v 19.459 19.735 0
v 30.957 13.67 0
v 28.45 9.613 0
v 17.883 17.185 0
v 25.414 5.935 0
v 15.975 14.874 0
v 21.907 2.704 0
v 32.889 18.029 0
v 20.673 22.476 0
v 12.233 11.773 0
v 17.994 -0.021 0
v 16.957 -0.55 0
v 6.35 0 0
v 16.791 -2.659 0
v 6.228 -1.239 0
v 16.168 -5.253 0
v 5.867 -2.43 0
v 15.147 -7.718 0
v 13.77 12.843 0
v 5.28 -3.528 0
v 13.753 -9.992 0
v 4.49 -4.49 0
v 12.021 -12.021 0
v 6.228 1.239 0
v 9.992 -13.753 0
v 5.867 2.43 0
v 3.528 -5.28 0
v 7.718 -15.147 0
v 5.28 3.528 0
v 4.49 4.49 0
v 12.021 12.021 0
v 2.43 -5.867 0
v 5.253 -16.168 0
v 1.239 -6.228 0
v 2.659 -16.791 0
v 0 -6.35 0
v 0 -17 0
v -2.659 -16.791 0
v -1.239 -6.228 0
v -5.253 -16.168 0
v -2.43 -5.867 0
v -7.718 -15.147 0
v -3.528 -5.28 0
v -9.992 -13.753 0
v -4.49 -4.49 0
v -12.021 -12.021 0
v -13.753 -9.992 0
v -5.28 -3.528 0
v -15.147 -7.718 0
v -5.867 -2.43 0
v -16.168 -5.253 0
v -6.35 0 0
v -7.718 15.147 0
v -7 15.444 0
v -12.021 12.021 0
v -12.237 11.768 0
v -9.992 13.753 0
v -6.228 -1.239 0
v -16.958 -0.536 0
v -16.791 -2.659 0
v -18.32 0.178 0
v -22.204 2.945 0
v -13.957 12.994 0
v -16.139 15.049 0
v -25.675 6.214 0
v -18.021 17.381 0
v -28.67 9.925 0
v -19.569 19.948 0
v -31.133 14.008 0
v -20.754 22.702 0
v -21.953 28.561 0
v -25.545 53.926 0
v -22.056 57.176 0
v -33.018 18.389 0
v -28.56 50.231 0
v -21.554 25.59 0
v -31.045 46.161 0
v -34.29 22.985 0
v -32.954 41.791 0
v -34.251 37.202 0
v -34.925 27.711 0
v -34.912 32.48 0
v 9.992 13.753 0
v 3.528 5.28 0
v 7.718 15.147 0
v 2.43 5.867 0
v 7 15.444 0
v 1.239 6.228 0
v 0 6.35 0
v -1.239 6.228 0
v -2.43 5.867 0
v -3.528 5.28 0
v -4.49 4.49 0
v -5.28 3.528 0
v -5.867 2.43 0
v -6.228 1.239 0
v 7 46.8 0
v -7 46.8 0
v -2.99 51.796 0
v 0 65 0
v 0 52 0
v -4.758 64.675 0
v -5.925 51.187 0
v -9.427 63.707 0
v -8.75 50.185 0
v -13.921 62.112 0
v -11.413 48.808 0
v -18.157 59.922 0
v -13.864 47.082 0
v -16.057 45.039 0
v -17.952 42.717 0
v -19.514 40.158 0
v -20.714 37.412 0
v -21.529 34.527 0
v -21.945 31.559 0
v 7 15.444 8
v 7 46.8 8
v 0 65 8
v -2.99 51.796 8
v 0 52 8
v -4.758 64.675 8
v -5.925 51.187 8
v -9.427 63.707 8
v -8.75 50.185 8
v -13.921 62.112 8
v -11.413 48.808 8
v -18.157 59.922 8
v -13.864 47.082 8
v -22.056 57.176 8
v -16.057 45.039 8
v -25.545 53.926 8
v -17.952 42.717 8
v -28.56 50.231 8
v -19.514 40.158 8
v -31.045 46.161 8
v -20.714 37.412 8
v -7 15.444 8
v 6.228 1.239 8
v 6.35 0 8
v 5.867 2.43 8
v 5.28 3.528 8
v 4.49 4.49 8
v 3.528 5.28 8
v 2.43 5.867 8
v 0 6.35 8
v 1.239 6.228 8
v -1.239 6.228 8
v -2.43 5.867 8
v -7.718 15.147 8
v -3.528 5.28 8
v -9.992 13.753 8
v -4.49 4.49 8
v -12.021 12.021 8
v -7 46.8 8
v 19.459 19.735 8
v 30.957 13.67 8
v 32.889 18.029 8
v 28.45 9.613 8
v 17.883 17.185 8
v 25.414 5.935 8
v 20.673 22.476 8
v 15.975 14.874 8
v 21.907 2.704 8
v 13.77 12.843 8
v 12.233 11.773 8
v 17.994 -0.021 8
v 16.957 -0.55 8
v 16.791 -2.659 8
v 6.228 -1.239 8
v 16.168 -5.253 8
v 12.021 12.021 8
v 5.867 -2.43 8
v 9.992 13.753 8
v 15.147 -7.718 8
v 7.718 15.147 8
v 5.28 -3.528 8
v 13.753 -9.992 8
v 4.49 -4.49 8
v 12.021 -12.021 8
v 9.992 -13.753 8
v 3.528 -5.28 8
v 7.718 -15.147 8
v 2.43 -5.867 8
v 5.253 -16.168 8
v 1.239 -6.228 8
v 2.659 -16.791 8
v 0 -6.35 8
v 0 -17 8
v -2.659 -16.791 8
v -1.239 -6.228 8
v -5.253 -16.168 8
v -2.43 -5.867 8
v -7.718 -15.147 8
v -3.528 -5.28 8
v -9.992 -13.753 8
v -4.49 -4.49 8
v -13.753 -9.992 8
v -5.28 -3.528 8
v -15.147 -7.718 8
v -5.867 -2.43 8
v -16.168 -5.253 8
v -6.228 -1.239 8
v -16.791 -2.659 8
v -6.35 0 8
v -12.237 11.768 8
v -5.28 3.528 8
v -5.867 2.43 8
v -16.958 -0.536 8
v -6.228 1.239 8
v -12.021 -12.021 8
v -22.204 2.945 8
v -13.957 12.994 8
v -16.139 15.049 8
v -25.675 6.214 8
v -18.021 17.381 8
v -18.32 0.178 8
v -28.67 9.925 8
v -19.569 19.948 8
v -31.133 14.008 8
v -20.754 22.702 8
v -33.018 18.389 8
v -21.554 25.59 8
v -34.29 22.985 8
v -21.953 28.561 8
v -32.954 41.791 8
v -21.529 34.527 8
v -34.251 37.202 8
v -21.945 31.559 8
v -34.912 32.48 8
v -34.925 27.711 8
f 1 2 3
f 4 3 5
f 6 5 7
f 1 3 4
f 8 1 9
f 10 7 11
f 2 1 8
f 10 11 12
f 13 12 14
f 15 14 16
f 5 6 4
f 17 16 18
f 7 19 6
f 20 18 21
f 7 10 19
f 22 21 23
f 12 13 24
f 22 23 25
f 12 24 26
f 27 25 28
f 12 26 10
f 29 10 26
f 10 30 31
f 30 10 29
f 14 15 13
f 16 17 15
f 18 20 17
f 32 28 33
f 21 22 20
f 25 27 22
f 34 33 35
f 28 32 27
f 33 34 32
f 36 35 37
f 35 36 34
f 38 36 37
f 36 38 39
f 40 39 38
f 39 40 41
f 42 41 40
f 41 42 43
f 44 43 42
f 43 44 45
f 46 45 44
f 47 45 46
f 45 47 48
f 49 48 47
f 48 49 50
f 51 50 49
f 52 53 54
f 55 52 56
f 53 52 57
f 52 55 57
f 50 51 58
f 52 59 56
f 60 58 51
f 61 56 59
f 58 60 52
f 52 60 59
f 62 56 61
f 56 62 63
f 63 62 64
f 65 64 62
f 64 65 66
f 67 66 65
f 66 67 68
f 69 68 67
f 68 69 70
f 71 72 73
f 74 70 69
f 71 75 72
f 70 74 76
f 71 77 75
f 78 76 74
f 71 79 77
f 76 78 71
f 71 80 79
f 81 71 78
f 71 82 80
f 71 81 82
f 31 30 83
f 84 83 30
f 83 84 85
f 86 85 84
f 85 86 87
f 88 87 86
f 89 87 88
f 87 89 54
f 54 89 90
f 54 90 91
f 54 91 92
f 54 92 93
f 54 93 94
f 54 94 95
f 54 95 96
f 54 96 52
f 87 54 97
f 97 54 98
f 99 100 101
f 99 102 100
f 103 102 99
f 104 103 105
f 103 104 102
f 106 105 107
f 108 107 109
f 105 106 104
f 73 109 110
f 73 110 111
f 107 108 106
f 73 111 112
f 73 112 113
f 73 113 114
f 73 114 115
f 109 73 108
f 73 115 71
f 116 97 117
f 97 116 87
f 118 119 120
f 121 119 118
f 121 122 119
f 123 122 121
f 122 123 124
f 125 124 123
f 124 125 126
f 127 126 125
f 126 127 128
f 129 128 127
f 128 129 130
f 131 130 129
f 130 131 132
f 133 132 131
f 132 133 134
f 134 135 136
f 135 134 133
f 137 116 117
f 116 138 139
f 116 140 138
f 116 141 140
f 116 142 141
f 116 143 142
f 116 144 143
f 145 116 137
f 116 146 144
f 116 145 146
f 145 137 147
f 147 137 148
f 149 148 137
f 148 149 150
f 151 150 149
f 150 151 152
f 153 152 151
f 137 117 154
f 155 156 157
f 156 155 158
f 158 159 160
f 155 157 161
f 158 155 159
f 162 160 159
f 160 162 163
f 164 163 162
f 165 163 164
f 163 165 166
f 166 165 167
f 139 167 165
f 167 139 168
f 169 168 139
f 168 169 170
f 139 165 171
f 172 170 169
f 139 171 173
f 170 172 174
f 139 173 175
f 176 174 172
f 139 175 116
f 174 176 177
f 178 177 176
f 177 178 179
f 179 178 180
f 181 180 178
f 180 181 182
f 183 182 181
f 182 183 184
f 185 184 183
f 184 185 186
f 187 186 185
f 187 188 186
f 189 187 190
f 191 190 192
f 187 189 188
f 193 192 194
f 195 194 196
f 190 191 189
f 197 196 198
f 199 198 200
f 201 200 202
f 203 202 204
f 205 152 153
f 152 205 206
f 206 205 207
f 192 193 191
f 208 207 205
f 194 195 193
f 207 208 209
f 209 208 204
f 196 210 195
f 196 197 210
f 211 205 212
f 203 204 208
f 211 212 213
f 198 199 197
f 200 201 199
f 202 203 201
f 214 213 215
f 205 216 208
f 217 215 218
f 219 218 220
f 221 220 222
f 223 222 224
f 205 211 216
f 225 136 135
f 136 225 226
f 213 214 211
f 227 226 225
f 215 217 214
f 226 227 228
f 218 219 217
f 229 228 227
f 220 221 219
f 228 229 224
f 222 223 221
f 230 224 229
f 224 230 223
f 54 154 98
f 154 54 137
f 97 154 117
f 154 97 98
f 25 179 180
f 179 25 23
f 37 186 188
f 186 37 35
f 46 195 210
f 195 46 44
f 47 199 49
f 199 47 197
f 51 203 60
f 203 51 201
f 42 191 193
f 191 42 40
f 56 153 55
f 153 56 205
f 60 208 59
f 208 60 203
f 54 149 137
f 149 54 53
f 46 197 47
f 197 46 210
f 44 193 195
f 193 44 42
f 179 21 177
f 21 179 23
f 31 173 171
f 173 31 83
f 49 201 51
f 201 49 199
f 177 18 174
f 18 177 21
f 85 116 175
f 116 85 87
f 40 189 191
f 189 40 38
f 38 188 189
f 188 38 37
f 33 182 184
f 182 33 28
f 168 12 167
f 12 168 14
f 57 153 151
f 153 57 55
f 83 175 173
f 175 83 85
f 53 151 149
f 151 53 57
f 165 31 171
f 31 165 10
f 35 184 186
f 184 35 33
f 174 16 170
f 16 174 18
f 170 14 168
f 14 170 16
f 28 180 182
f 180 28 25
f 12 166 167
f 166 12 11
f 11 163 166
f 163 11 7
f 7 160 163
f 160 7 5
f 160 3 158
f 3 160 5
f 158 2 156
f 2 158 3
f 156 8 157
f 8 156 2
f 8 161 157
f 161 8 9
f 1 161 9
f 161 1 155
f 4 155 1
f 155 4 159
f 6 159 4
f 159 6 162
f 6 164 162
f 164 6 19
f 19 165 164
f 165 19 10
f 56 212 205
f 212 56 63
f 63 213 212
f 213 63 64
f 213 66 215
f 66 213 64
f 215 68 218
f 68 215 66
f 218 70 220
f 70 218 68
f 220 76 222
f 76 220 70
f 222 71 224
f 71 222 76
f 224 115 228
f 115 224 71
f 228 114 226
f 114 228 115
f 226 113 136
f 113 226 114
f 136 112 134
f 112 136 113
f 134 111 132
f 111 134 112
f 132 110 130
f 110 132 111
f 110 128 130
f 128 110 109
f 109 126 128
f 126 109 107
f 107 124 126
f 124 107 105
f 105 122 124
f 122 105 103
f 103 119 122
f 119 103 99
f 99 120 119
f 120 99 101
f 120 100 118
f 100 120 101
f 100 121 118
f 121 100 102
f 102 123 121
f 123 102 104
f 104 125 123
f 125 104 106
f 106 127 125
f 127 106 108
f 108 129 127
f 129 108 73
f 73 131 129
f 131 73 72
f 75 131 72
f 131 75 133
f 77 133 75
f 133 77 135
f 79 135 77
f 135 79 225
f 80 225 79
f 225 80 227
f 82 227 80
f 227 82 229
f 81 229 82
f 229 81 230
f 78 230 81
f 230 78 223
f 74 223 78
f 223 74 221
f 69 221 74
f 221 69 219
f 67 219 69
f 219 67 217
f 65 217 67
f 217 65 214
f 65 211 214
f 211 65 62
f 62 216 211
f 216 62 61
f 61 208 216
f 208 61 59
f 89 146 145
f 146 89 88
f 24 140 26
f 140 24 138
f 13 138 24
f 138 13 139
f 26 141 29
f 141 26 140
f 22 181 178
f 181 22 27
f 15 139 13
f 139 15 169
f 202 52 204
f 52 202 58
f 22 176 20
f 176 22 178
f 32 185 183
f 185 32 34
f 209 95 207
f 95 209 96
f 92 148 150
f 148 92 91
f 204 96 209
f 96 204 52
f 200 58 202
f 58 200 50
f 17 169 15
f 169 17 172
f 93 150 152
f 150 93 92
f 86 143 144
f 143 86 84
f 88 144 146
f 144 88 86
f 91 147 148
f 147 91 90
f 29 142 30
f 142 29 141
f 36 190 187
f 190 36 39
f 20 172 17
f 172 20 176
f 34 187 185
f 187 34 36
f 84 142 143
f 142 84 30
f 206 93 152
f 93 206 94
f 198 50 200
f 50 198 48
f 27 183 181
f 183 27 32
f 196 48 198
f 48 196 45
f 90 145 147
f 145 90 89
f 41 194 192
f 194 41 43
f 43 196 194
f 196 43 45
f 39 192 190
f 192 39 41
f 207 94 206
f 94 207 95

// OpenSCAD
$fn = 32;

// ----------------------------------------------------------------------
// Hook: 60 mm shank into a 22 mm curl, 8 mm thick
// ----------------------------------------------------------------------

// --- parameters (mm) ---
shank_len = 60;           // shank length from the boss centre
shank_w = 14;             // shank width
boss_d = 34;              // boss diameter
bore_d = 12.7;            // boss bore
curl_in = 22;             // curl inner radius
curl_out = 35;            // curl outer radius
curl_sweep = 250;         // curl sweep angle
hook_t = 8;               // hook thickness

shank_profile = [[-7, 46.8], [7, 46.8], [7, 15], [-7, 15]];
boss_profile = [[17, 0], [16.791, 2.659], [16.168, 5.253], [15.147, 7.718], [13.753, 9.992], [12.021, 12.021], [9.992, 13.753], [7.718, 15.147], [5.253, 16.168], [2.659, 16.791], [0, 17], [-2.659, 16.791], [-5.253, 16.168], [-7.718, 15.147], [-9.992, 13.753], [-12.021, 12.021], [-13.753, 9.992], [-15.147, 7.718], [-16.168, 5.253], [-16.791, 2.659], [-17, 0], [-16.791, -2.659], [-16.168, -5.253], [-15.147, -7.718], [-13.753, -9.992], [-12.021, -12.021], [-9.992, -13.753], [-7.718, -15.147], [-5.253, -16.168], [-2.659, -16.791], [0, -17], [2.659, -16.791], [5.253, -16.168], [7.718, -15.147], [9.992, -13.753], [12.021, -12.021], [13.753, -9.992], [15.147, -7.718], [16.168, -5.253], [16.791, -2.659]];
curl_profile = [[0, 65], [-4.758, 64.675], [-9.427, 63.707], [-13.921, 62.112], [-18.157, 59.922], [-22.056, 57.176], [-25.545, 53.926], [-28.56, 50.231], [-31.045, 46.161], [-32.954, 41.791], [-34.251, 37.202], [-34.912, 32.48], [-34.925, 27.711], [-34.29, 22.985], [-33.018, 18.389], [-31.133, 14.008], [-28.67, 9.925], [-25.675, 6.214], [-22.204, 2.945], [-18.32, 0.178], [-14.096, -2.036], [-9.611, -3.655], [-4.947, -4.649], [-0.191, -4.999], [4.568, -4.701], [9.243, -3.757], [13.746, -2.188], [17.994, -0.021], [21.907, 2.704], [25.414, 5.935], [28.45, 9.613], [30.957, 13.67], [32.889, 18.029], [20.673, 22.476], [19.459, 19.735], [17.883, 17.185], [15.975, 14.874], [13.77, 12.843], [11.31, 11.13], [8.64, 9.768], [5.81, 8.781], [2.872, 8.188], [-0.12, 8], [-3.109, 8.221], [-6.041, 8.846], [-8.86, 9.863], [-11.515, 11.254], [-13.957, 12.994], [-16.139, 15.049], [-18.021, 17.381], [-19.569, 19.948], [-20.754, 22.702], [-21.554, 25.59], [-21.953, 28.561], [-21.945, 31.559], [-21.529, 34.527], [-20.714, 37.412], [-19.514, 40.158], [-17.952, 42.717], [-16.057, 45.039], [-13.864, 47.082], [-11.413, 48.808], [-8.75, 50.185], [-5.925, 51.187], [-2.99, 51.796], [0, 52]];

difference() {
  union() {
    /* three overlapping outlines: shank, boss and the smooth curl */
    linear_extrude(height = hook_t) polygon(shank_profile);
    linear_extrude(height = hook_t) polygon(boss_profile);
    linear_extrude(height = hook_t) polygon(curl_profile);
  }
  translate([0, 0, -2.5]) cylinder(h = hook_t + 5, d = bore_d);
}
